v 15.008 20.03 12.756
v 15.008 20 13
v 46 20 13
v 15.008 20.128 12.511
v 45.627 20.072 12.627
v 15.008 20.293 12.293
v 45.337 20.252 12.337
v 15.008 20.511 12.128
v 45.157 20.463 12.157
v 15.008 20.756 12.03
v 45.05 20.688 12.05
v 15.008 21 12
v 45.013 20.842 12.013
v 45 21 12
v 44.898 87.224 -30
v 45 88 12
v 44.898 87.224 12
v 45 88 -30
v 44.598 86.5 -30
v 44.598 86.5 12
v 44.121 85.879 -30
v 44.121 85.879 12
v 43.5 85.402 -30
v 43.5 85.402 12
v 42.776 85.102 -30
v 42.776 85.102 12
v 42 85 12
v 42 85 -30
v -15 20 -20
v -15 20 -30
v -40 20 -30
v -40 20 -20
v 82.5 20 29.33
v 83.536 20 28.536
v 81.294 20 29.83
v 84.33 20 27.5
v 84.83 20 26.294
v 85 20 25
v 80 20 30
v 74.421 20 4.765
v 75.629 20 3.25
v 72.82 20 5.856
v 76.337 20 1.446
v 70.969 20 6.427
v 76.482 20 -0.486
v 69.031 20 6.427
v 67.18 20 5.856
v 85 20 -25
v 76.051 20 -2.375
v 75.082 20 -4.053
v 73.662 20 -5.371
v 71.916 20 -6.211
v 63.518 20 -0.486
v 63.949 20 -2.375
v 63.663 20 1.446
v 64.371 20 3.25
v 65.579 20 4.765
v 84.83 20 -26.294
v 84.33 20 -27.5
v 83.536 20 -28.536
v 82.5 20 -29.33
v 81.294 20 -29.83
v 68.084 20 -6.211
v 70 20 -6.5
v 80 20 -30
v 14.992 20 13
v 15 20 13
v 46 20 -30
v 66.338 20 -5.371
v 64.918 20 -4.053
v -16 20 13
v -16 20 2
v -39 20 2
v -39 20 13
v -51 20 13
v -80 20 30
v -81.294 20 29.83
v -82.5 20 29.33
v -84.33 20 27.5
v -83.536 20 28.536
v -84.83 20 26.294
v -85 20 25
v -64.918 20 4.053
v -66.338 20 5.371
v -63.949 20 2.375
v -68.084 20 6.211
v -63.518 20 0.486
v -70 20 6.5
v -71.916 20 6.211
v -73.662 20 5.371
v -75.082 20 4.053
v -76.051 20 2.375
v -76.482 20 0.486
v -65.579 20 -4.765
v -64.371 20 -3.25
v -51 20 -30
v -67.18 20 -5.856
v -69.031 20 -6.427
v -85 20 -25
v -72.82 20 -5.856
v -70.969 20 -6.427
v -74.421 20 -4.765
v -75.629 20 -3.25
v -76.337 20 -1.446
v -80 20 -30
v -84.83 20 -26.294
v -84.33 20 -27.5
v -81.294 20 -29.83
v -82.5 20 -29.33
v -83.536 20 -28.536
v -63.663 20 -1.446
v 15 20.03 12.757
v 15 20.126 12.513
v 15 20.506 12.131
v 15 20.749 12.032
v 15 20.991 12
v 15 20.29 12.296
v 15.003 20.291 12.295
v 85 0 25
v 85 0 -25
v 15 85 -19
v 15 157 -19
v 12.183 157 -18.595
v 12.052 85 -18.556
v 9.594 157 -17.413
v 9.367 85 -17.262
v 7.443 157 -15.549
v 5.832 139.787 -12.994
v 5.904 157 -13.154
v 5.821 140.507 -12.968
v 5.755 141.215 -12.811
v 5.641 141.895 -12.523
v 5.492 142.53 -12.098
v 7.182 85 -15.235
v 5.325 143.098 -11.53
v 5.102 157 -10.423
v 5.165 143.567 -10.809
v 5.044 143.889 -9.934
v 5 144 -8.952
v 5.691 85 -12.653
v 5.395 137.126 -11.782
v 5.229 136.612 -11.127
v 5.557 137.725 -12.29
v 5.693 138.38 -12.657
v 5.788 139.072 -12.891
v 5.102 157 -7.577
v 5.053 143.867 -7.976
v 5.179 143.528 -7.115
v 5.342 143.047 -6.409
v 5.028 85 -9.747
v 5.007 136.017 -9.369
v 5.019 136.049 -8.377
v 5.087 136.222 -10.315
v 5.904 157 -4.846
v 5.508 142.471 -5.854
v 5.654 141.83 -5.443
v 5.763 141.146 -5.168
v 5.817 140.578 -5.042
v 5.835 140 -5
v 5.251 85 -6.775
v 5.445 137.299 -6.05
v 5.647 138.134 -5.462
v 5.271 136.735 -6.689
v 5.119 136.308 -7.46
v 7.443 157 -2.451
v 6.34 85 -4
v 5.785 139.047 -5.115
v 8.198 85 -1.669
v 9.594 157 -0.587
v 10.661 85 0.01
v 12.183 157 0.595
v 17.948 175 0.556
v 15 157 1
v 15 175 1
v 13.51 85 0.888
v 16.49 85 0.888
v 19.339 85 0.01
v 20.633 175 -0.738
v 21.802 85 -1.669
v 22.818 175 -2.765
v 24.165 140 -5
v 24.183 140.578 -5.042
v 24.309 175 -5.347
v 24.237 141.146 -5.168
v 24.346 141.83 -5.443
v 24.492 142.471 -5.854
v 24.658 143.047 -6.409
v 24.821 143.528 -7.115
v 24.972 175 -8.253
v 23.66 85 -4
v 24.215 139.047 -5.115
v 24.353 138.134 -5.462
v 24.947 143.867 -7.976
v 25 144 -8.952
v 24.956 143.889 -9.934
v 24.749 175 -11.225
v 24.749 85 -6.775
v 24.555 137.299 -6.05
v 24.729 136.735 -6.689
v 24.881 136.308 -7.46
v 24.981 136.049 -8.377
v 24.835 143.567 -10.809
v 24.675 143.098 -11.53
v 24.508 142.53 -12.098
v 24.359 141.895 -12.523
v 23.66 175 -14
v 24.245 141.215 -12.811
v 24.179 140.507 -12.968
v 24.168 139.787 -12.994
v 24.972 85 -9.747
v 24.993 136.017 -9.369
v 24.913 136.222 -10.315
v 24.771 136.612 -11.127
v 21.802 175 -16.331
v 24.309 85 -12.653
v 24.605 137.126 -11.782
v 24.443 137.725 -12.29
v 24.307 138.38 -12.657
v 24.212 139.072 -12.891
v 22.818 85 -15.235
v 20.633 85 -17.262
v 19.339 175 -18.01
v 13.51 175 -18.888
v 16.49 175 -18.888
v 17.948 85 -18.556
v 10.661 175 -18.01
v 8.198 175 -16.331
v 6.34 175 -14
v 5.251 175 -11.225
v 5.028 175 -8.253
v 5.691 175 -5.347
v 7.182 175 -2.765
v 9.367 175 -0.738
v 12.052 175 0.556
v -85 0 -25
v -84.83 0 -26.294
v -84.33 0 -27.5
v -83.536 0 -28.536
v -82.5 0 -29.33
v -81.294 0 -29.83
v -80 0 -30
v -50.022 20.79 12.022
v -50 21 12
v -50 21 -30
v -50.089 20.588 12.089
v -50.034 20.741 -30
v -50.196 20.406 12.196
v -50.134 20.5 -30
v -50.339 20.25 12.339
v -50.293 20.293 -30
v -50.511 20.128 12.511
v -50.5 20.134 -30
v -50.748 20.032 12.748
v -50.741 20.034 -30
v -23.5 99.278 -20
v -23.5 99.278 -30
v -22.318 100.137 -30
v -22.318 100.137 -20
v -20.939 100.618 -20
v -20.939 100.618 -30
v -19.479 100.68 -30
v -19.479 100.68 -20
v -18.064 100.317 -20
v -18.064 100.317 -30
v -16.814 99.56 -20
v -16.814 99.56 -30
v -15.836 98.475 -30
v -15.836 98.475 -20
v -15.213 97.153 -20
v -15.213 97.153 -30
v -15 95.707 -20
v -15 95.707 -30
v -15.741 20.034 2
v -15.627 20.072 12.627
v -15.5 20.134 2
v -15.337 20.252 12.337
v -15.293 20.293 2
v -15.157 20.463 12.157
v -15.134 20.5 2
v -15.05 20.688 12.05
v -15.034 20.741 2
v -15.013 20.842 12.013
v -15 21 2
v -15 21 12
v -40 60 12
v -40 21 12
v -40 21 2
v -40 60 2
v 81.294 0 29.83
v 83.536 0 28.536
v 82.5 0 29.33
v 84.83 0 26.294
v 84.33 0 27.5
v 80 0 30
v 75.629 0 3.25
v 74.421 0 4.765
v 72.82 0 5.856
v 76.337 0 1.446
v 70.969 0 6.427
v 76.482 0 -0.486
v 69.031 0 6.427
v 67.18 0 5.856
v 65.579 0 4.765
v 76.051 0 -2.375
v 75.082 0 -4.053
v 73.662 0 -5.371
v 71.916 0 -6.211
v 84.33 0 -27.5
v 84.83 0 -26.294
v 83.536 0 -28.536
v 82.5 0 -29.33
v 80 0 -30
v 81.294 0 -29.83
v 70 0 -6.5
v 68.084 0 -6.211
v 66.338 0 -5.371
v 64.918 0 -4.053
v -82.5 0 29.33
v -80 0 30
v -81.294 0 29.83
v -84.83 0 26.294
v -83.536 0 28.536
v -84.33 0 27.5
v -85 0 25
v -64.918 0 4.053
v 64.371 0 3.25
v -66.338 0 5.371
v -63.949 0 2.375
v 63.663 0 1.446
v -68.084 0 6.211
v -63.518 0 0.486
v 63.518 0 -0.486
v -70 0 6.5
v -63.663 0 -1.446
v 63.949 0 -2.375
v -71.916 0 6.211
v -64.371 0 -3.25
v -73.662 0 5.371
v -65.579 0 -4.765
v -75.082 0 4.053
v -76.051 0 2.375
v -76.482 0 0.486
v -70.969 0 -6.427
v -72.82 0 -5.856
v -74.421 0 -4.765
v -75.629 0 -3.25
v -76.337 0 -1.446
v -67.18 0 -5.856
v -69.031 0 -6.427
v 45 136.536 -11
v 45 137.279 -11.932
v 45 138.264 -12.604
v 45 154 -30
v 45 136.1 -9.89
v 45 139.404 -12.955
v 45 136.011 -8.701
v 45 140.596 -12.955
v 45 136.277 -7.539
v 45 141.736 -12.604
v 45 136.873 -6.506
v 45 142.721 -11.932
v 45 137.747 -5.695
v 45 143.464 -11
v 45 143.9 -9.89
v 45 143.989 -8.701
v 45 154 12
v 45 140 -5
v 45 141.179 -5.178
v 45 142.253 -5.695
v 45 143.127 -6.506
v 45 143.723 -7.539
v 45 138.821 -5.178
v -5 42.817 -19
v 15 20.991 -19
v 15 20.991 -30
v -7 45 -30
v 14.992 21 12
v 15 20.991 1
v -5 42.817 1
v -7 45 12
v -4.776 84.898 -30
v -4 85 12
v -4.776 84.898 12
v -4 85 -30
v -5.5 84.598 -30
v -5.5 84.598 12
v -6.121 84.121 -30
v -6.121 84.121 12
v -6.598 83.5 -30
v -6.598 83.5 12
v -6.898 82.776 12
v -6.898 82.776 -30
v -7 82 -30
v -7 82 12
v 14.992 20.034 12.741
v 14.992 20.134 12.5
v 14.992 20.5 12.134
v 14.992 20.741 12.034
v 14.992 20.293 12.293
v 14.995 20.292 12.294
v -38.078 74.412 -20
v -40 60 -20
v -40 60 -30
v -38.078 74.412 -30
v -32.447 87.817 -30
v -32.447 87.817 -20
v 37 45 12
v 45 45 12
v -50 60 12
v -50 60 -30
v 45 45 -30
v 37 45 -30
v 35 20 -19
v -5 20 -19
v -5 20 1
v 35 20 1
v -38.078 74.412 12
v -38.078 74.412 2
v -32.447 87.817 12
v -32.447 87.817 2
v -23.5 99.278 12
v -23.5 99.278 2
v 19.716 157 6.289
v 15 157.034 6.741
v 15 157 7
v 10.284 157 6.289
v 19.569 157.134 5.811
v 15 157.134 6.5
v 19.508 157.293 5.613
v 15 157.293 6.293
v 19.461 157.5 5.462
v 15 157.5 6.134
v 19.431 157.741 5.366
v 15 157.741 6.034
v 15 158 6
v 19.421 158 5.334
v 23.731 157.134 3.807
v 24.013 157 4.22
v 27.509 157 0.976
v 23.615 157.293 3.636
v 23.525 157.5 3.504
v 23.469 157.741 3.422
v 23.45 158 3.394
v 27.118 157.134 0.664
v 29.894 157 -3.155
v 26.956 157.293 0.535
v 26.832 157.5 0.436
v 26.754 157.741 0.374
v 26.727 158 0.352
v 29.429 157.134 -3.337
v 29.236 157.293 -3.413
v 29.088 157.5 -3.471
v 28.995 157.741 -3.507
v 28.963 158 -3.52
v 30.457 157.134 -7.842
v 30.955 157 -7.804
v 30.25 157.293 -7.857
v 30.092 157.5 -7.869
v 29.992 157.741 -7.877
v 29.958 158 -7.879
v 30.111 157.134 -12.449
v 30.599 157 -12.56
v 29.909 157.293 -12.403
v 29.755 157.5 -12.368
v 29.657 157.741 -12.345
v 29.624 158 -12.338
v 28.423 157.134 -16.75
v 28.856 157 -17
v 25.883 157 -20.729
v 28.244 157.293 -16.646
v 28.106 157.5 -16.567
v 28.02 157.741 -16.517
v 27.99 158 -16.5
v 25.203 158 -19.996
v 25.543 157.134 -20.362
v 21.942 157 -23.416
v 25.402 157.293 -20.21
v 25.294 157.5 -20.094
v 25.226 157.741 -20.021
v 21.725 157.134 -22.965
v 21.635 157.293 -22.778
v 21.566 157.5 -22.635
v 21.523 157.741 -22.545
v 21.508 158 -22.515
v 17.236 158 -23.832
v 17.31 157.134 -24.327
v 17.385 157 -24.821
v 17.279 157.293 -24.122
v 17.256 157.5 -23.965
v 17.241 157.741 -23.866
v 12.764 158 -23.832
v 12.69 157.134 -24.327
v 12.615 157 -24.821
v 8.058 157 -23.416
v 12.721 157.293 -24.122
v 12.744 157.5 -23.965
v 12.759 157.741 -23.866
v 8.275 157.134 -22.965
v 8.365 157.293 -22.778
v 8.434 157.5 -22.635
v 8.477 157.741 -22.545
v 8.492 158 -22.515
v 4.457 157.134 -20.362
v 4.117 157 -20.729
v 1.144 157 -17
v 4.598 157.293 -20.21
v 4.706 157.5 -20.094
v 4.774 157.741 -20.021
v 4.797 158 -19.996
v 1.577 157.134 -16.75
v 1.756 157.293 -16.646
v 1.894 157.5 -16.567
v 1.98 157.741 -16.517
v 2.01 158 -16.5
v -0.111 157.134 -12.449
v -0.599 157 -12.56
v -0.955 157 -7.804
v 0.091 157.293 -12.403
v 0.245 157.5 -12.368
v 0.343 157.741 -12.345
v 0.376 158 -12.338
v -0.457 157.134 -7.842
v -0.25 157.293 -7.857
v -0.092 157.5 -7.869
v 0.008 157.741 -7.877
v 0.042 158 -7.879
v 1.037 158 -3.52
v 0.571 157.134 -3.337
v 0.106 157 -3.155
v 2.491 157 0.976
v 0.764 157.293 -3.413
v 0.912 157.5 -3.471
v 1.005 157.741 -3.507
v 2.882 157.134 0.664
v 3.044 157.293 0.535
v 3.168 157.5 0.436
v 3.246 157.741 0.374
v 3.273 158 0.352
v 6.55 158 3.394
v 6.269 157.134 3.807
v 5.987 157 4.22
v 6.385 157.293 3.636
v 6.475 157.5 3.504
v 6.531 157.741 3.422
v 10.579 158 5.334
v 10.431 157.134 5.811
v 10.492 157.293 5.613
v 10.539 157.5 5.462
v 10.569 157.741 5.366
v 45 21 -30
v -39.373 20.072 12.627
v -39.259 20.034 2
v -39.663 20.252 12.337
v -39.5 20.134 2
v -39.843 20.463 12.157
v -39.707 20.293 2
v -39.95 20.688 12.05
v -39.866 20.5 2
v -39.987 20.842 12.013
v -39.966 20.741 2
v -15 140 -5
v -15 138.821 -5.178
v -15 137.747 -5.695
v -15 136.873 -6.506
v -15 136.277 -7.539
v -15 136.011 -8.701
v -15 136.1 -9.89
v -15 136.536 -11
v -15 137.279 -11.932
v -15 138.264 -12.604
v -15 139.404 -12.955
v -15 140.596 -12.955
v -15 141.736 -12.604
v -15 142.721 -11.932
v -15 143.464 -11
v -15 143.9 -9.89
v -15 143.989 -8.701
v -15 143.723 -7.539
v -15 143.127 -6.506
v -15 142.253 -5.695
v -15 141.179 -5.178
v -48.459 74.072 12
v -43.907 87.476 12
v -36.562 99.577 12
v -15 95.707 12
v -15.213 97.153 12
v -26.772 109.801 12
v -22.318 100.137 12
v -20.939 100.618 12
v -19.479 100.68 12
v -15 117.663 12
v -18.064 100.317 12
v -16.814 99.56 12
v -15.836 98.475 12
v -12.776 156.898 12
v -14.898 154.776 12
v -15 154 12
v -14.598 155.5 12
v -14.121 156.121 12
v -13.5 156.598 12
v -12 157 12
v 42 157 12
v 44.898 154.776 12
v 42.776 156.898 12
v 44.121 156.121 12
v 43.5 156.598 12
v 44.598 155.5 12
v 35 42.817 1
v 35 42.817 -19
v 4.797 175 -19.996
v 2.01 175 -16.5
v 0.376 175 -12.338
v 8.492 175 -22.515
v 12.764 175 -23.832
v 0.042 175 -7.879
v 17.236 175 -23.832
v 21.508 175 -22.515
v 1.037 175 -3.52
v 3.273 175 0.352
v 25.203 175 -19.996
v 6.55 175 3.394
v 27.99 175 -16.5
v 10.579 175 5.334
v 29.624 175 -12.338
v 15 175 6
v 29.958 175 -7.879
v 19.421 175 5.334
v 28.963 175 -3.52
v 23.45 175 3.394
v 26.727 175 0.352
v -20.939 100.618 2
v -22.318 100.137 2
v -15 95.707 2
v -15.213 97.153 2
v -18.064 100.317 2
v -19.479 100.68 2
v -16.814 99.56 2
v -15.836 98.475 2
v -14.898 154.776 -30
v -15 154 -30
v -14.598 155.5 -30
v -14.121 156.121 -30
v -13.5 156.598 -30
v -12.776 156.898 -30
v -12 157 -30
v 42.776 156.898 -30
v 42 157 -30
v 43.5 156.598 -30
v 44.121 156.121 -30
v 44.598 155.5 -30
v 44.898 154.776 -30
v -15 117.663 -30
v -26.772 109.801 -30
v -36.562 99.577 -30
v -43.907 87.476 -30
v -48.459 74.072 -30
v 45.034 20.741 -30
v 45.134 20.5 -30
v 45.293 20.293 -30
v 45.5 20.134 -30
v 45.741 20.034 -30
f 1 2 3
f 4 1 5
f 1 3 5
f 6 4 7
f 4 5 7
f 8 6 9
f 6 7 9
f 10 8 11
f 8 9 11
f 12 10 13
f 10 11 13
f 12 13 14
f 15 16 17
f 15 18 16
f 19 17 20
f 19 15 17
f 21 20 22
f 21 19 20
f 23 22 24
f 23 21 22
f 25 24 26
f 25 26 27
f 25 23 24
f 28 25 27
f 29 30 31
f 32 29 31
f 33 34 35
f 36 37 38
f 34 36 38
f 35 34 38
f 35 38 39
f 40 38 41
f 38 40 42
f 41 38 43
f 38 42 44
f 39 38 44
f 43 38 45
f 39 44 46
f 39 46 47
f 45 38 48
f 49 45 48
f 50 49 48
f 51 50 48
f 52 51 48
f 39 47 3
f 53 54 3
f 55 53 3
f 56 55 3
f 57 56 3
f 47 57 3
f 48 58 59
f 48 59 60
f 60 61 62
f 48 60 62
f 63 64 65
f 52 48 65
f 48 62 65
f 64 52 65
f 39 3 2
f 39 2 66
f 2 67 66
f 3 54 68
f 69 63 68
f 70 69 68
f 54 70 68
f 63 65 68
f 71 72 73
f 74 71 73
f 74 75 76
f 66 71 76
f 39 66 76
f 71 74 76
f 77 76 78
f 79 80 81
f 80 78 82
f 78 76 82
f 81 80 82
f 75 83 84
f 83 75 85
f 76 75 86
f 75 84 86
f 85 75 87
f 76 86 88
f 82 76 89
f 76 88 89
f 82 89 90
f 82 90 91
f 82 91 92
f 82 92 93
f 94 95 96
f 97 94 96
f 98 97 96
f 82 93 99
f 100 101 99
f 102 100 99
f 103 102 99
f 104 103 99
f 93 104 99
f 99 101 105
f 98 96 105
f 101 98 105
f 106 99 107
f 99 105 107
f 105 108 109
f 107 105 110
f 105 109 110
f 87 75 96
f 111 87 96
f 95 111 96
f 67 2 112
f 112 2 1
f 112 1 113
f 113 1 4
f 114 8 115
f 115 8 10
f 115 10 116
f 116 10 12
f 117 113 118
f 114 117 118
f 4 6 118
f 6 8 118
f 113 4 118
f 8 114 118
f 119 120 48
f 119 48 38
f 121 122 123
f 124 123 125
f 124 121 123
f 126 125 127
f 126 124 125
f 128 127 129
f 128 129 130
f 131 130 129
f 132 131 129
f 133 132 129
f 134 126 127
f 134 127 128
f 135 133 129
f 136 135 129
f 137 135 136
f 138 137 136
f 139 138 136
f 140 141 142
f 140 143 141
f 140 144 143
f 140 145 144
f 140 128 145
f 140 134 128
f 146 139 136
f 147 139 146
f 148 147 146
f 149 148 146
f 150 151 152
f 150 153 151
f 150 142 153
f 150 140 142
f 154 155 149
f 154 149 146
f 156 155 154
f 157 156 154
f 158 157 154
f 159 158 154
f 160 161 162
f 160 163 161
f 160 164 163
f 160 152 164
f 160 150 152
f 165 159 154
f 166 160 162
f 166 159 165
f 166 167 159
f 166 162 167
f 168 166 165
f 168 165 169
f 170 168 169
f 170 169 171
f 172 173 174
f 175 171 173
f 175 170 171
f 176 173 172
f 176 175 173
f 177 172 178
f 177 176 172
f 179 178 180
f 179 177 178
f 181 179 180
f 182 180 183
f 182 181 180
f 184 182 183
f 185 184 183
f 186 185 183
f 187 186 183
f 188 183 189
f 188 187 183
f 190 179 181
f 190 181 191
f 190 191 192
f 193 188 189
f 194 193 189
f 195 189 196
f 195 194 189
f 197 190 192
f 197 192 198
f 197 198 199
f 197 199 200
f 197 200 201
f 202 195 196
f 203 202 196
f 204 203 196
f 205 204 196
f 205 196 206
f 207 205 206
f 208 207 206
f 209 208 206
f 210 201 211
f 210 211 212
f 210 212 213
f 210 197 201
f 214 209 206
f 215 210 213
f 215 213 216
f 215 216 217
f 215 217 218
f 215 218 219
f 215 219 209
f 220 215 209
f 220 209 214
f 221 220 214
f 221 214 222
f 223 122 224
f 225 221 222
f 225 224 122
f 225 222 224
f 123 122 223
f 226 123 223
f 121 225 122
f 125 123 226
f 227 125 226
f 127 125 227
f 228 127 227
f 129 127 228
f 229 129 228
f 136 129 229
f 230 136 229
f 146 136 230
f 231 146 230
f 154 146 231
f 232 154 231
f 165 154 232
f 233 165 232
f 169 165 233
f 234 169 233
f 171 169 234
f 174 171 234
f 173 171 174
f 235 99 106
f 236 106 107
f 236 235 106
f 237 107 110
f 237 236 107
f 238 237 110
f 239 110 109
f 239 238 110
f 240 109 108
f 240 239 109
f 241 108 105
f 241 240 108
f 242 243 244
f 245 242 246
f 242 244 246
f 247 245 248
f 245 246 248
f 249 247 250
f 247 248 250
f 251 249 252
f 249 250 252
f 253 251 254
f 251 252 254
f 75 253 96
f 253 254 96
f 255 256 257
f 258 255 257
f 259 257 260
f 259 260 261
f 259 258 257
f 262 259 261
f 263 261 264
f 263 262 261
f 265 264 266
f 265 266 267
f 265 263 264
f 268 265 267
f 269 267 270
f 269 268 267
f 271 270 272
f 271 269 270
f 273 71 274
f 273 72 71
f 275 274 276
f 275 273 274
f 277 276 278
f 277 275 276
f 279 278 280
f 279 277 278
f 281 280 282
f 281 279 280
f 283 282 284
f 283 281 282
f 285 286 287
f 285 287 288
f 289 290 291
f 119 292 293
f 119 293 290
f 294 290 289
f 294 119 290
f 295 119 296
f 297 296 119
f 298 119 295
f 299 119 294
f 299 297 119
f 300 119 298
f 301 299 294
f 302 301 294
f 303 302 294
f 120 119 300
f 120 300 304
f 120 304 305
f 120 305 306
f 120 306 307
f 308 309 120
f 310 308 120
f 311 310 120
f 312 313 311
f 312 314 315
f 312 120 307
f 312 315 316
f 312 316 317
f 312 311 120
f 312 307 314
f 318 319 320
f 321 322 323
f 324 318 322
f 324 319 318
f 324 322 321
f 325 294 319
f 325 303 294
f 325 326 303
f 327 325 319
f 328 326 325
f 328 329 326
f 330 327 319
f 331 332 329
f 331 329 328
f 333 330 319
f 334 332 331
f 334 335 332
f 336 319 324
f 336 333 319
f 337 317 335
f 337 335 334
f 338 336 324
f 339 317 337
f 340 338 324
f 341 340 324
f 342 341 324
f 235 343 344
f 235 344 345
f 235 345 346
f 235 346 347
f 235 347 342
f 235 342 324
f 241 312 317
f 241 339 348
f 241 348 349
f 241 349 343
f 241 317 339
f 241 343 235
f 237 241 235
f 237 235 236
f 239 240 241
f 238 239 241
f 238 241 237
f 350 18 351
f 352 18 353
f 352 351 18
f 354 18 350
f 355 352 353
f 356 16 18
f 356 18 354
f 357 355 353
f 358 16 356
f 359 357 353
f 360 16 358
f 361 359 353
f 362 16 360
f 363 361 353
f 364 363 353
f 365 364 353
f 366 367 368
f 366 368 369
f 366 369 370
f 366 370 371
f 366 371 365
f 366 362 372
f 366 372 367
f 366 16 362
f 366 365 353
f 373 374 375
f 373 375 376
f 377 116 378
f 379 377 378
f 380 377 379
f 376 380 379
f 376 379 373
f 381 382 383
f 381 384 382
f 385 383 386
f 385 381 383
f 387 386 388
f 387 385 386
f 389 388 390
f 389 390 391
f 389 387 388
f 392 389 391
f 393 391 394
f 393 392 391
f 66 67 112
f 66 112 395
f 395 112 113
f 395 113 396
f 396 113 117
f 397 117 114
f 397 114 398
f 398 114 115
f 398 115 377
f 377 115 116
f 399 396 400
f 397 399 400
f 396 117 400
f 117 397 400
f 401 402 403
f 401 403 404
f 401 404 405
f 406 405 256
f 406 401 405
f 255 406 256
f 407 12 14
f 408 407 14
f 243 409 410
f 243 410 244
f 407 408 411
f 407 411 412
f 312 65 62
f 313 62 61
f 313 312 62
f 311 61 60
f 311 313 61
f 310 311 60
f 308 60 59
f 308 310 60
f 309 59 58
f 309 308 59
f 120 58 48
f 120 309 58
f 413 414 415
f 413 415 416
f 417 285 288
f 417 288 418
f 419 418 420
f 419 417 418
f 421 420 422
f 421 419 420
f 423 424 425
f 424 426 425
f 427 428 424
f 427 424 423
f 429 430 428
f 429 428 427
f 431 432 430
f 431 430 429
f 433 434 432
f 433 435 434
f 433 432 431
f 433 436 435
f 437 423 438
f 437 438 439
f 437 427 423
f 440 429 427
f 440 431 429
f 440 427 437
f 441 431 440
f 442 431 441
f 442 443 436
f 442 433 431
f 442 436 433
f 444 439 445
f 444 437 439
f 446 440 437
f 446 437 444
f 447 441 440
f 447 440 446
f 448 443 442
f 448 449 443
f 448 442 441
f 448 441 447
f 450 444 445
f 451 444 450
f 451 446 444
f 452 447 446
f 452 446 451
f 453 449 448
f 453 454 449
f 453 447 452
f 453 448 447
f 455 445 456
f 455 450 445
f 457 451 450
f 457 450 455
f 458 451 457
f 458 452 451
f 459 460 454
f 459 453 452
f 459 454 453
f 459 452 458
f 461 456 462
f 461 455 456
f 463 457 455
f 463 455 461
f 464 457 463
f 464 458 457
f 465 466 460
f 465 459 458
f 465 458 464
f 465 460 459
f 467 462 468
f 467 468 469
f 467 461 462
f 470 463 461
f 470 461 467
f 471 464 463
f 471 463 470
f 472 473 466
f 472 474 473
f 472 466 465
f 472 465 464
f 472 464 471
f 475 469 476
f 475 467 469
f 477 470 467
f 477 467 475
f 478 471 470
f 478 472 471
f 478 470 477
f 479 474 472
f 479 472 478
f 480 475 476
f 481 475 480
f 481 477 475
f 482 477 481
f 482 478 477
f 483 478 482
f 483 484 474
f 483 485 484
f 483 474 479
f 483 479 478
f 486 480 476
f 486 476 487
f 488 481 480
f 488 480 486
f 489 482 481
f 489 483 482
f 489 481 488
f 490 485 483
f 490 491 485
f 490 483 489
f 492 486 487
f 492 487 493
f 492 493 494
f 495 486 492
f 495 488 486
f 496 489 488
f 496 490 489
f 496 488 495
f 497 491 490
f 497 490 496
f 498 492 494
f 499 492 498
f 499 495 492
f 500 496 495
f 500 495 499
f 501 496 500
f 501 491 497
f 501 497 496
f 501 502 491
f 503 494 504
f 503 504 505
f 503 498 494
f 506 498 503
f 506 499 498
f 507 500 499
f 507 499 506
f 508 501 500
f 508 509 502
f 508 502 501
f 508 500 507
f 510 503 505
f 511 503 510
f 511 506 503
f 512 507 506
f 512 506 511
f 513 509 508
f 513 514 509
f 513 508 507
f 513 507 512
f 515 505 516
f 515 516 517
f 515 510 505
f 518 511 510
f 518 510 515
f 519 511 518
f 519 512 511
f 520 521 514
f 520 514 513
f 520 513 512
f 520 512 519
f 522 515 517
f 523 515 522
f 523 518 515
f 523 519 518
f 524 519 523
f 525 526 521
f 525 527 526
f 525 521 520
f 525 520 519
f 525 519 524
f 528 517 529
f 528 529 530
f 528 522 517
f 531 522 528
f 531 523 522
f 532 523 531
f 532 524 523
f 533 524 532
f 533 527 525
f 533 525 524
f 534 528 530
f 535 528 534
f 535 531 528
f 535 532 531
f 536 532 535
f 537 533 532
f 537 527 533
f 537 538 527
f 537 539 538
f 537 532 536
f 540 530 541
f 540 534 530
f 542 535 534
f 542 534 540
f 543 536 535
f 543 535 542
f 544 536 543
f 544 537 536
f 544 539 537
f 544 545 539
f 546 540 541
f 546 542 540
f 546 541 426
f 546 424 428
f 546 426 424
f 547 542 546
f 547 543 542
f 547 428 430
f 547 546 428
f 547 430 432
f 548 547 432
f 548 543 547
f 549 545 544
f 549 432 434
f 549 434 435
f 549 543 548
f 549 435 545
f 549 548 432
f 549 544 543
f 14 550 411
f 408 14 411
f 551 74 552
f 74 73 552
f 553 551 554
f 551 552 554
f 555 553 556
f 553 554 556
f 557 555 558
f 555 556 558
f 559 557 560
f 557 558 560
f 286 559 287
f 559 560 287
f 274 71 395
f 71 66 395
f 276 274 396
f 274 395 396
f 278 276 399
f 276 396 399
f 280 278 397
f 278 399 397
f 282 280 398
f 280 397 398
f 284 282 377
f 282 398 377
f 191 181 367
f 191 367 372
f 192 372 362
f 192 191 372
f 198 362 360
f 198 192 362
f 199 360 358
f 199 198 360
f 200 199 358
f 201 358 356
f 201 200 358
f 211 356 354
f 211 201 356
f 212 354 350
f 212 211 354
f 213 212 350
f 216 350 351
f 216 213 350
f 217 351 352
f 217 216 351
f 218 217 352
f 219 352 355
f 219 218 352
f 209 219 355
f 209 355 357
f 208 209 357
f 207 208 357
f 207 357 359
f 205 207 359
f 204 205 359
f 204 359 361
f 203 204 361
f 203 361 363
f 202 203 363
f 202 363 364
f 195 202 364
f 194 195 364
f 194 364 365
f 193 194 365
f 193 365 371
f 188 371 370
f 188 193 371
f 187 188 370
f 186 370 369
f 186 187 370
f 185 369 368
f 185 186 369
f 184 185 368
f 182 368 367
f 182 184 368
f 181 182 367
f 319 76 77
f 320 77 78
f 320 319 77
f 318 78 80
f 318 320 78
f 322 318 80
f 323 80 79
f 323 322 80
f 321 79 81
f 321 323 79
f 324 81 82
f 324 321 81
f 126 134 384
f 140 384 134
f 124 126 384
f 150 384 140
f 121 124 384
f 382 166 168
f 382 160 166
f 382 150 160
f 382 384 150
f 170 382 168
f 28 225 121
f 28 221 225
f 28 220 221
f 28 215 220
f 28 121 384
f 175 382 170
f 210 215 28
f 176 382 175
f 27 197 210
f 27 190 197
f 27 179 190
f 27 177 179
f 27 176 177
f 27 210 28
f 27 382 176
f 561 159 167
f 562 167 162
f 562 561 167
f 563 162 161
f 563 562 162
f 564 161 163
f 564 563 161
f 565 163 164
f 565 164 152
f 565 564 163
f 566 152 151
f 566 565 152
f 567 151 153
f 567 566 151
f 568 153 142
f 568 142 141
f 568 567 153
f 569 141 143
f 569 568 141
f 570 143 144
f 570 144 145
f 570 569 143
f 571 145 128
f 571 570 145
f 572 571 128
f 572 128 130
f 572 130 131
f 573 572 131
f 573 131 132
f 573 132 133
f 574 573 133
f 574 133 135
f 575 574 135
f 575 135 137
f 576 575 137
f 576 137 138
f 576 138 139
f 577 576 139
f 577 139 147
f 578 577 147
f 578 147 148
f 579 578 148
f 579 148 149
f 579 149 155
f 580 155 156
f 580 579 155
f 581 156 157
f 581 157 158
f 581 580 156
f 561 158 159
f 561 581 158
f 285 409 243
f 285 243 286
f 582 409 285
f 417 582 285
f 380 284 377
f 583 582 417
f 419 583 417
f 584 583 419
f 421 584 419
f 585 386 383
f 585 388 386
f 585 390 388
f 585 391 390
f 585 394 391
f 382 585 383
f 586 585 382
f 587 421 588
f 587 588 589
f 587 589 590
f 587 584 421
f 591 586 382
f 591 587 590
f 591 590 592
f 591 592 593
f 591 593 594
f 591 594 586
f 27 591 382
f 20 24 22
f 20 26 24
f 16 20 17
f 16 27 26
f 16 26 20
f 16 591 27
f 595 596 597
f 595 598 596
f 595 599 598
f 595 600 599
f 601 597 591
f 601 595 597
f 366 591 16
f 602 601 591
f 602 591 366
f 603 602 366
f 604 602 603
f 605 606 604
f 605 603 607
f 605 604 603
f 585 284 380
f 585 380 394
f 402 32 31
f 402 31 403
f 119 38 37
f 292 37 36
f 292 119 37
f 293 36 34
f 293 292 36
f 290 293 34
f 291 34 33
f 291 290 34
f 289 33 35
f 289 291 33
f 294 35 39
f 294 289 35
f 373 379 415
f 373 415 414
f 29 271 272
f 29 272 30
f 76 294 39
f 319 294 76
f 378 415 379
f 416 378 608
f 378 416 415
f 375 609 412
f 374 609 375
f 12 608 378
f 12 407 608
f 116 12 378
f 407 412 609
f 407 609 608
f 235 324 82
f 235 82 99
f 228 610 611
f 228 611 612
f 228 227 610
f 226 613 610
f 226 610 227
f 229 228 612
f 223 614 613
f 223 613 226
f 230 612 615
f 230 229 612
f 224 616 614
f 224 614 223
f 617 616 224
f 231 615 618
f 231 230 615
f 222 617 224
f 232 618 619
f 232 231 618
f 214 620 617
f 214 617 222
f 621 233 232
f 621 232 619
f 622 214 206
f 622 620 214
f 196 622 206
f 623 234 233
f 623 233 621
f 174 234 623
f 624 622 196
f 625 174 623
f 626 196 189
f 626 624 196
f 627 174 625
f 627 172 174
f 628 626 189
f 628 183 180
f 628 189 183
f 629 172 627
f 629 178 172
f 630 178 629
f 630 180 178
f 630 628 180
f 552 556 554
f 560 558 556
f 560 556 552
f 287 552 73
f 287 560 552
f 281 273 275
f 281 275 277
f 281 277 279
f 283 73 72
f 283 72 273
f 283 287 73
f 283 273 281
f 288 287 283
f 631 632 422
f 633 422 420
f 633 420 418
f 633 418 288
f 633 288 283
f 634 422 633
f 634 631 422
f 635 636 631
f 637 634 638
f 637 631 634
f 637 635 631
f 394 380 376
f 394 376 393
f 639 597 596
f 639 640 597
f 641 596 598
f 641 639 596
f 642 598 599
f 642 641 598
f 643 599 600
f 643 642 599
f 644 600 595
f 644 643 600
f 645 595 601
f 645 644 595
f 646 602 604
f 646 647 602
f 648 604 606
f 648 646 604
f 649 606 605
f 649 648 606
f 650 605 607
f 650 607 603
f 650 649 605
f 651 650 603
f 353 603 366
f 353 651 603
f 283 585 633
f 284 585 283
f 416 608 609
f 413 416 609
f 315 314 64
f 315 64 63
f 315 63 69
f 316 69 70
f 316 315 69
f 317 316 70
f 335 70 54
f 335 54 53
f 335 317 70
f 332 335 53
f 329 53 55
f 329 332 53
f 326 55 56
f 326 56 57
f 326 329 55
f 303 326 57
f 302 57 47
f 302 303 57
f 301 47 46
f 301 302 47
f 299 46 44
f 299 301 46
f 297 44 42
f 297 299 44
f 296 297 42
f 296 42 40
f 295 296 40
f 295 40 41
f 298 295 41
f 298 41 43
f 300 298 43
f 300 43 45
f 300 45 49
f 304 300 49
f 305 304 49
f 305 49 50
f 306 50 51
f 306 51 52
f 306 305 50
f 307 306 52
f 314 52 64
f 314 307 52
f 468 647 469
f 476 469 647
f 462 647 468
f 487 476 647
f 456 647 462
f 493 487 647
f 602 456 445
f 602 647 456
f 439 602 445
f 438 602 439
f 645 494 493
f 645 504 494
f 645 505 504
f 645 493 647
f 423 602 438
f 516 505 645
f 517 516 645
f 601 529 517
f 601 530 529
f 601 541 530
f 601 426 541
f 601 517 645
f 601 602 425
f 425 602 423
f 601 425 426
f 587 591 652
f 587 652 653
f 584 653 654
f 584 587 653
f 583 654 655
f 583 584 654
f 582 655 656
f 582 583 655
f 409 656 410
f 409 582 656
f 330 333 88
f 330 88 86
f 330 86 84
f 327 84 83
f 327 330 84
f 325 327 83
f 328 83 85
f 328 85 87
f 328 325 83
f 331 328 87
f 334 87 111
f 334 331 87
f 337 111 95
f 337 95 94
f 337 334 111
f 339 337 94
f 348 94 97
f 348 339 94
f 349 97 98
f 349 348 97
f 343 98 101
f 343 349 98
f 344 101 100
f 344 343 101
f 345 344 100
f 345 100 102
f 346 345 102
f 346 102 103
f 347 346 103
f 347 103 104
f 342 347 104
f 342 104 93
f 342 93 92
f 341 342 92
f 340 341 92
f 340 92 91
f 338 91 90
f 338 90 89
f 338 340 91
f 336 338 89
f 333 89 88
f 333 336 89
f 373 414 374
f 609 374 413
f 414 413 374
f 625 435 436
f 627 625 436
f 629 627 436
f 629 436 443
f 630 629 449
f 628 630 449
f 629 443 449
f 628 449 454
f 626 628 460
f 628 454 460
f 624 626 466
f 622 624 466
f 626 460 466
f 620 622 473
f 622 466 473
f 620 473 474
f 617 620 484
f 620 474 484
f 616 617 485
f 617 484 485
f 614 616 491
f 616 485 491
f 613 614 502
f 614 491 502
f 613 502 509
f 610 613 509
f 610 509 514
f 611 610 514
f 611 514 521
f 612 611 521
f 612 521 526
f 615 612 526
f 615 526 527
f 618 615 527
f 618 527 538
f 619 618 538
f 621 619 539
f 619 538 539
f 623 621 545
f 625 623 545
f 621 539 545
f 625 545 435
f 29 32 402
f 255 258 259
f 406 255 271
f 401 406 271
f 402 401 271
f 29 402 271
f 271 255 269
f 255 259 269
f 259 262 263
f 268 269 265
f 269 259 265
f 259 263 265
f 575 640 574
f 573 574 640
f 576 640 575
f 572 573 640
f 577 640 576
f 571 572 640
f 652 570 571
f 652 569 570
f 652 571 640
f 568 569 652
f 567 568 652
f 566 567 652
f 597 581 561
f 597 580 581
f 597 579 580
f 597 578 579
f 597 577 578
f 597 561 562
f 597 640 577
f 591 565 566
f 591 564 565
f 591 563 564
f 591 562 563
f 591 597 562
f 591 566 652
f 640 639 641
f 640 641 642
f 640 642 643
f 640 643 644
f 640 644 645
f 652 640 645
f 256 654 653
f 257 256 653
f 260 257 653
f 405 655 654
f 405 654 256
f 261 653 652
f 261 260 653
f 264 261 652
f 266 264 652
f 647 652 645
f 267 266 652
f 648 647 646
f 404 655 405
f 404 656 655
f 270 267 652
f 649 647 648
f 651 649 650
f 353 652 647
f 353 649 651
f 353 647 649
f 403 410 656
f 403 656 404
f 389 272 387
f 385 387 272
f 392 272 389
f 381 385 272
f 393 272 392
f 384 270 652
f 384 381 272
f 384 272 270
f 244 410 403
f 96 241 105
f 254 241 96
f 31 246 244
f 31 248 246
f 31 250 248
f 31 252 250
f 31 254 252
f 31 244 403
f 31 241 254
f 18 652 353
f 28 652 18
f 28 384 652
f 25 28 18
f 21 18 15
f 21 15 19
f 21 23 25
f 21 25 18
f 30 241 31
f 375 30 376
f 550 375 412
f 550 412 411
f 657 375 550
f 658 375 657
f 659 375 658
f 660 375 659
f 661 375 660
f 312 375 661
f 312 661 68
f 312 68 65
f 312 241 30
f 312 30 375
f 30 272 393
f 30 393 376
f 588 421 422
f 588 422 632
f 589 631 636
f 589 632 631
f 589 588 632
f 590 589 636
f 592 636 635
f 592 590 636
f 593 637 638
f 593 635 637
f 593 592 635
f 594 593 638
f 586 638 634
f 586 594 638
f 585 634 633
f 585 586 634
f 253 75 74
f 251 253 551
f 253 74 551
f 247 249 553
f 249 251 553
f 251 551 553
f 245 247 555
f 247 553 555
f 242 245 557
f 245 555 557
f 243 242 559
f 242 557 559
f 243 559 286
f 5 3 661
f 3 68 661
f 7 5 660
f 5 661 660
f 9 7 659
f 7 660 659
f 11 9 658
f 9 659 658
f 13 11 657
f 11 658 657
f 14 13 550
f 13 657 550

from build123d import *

# Parameters (mm, degrees)
SKETCH1_R               = 6.5
BOSS_EXTRUDE1_DEPTH     = 20
BOSS_EXTRUDE2_DEPTH     = 42
SKETCH4_W               = 40
SKETCH4_H               = 20
CUT_EXTRUDE1_DEPTH      = 25
BOSS_EXTRUDE3_DEPTH     = 11
FILLET1_R               = 3
SKETCH7_R               = 15
SKETCH7_R_2             = 10
BOSS_EXTRUDE4_DEPTH     = 18
FILLET2_R               = 1
CUT_EXTRUDE2_START      = -94
SKETCH8_R               = 10
CUT_EXTRUDE2_DEPTH      = 94
CUT_EXTRUDE3_DEPTH      = 199.421269084
CUT_EXTRUDE3_DEPTH_BACK = 199.421269084
SKETCH9_R               = 4


with BuildPart() as part:
    # Sketch1 → Boss-Extrude1 (new body)
    with BuildSketch(Plane(origin=(0, 0, 0), x_dir=(1, 0, 0), z_dir=(0, 1, 0))):
        with BuildLine():
            Line((80, -30), (-80, -30))
            ThreePointArc((-80, -30), (-83.535533906, -28.535533906), (-85, -25))
            Line((-85, -25), (-85, 25))
            ThreePointArc((-85, 25), (-83.535533906, 28.535533906), (-80, 30))
            Line((-80, 30), (80, 30))
            ThreePointArc((80, 30), (83.535533906, 28.535533906), (85, 25))
            Line((85, 25), (85, -25))
            ThreePointArc((85, -25), (83.535533906, -28.535533906), (80, -30))
        make_face()
        with Locations(Location((-70, 0, 0), (0, 0, 270))):
            Circle(SKETCH1_R, mode=Mode.SUBTRACT)
        with Locations(Location((70, 0, 0), (0, 0, 90))):
            Circle(SKETCH1_R, mode=Mode.SUBTRACT)
    extrude(amount=BOSS_EXTRUDE1_DEPTH)

    # Sketch2 → Boss-Extrude2 (add)
    with BuildSketch(Plane.XY.offset(12)):
        with BuildLine():
            Line((15, 20.991212976), (-7, 45))
            Line((-7, 45), (-7, 85))
            Line((-7, 85), (45, 85))
            Line((45, 85), (45, 157))
            Line((45, 157), (-15, 157))
            Line((-15, 157), (-15, 117.662812973))
            ThreePointArc((-15, 117.662812973), (-40.565276927, 93.726843908), (-50, 60))
            Line((-50, 60), (-50, 20))
            Line((-50, 20), (-40, 20))
            Line((-40, 20), (-40, 60))
            ThreePointArc((-40, 60), (-35.707494515, 81.301408404), (-23.5, 99.277856357))
            ThreePointArc((-23.5, 99.277856357), (-18.063508327, 100.316914371), (-15, 95.707142143))
            Line((-15, 95.707142143), (-15, 20))
            Line((-15, 20), (45, 20))
            Line((45, 20), (45, 45))
            Line((45, 45), (37, 45))
            Line((37, 45), (15, 20.991212976))
        make_face()
    extrude(amount=-BOSS_EXTRUDE2_DEPTH)

    # Sketch4 → Cut-Extrude1 (cut)
    with BuildSketch(Plane(origin=(0, 45, 0), x_dir=(1, 0, 0), z_dir=(0, 1, 0))):
        with Locations((15, 9)):
            Rectangle(SKETCH4_W, SKETCH4_H)
    extrude(amount=-CUT_EXTRUDE1_DEPTH, mode=Mode.SUBTRACT)

    # Sketch5 → Boss-Extrude3 (add, symmetric)
    with BuildSketch(Plane.XY.offset(-9)):
        with BuildLine():
            Line((-15, 20), (-15, 95.707142143))
            ThreePointArc((-15, 95.707142143), (-18.063508327, 100.316914371), (-23.5, 99.277856357))
            ThreePointArc((-23.5, 99.277856357), (-35.707494515, 81.301408404), (-40, 60))
            Line((-40, 60), (-40, 20))
            Line((-40, 20), (-15, 20))
        make_face()
    extrude(amount=BOSS_EXTRUDE3_DEPTH, both=True)

    # Fillet1
    fillet1_edges = [part.edges().sort_by_distance(p)[0] for p in [
        (-7, 85, -9),
        (45, 85, -9),
        (45, 157, -9),
        (-15, 157, -9),
    ]]
    fillet(fillet1_edges, radius=FILLET1_R)

    # Sketch7 → Boss-Extrude4 (add)
    with BuildSketch(Plane(origin=(0, 157, 0), x_dir=(1, 0, 0), z_dir=(0, 1, 0))):
        with Locations(Location((15, 9, 0), (0, 0, 270))):
            Circle(SKETCH7_R)
        with Locations(Location((15, 9, 0), (0, 0, 270))):
            Circle(SKETCH7_R_2, mode=Mode.SUBTRACT)
    extrude(amount=BOSS_EXTRUDE4_DEPTH)

    # Fillet2
    fillet2_edges = [part.edges().sort_by_distance(p)[0] for p in [
        (15, 157, -24),
        (45, 20, -9),
        (15, 20, 12),
        (-50, 20, -9),
        (-45, 20, 12),
        (-40, 20, 7),
        (-15, 20, 7),
    ]]
    fillet(fillet2_edges, radius=FILLET2_R)

    # Sketch8 → Cut-Extrude2 (cut)
    with BuildSketch(Plane(origin=(0, 157, 0), x_dir=(1, 0, 0), z_dir=(0, 1, 0)).offset(CUT_EXTRUDE2_START)):
        with Locations(Location((15, 9, 0), (0, 0, 90))):
            Circle(SKETCH8_R)
    extrude(amount=CUT_EXTRUDE2_DEPTH, mode=Mode.SUBTRACT)

    # Sketch9 → Cut-Extrude3 (cut, two sides: drawn at the far end of the back side and taken through both)
    with BuildSketch(Plane(origin=(0, 0, -9), x_dir=(0, 0, -1), z_dir=(1, 0, 0)).offset(-CUT_EXTRUDE3_DEPTH_BACK)):
        with Locations(Location((0, 140, 0), (0, 0, 180))):
            Circle(SKETCH9_R)
    extrude(amount=CUT_EXTRUDE3_DEPTH + CUT_EXTRUDE3_DEPTH_BACK, mode=Mode.SUBTRACT)


solid = part.part
